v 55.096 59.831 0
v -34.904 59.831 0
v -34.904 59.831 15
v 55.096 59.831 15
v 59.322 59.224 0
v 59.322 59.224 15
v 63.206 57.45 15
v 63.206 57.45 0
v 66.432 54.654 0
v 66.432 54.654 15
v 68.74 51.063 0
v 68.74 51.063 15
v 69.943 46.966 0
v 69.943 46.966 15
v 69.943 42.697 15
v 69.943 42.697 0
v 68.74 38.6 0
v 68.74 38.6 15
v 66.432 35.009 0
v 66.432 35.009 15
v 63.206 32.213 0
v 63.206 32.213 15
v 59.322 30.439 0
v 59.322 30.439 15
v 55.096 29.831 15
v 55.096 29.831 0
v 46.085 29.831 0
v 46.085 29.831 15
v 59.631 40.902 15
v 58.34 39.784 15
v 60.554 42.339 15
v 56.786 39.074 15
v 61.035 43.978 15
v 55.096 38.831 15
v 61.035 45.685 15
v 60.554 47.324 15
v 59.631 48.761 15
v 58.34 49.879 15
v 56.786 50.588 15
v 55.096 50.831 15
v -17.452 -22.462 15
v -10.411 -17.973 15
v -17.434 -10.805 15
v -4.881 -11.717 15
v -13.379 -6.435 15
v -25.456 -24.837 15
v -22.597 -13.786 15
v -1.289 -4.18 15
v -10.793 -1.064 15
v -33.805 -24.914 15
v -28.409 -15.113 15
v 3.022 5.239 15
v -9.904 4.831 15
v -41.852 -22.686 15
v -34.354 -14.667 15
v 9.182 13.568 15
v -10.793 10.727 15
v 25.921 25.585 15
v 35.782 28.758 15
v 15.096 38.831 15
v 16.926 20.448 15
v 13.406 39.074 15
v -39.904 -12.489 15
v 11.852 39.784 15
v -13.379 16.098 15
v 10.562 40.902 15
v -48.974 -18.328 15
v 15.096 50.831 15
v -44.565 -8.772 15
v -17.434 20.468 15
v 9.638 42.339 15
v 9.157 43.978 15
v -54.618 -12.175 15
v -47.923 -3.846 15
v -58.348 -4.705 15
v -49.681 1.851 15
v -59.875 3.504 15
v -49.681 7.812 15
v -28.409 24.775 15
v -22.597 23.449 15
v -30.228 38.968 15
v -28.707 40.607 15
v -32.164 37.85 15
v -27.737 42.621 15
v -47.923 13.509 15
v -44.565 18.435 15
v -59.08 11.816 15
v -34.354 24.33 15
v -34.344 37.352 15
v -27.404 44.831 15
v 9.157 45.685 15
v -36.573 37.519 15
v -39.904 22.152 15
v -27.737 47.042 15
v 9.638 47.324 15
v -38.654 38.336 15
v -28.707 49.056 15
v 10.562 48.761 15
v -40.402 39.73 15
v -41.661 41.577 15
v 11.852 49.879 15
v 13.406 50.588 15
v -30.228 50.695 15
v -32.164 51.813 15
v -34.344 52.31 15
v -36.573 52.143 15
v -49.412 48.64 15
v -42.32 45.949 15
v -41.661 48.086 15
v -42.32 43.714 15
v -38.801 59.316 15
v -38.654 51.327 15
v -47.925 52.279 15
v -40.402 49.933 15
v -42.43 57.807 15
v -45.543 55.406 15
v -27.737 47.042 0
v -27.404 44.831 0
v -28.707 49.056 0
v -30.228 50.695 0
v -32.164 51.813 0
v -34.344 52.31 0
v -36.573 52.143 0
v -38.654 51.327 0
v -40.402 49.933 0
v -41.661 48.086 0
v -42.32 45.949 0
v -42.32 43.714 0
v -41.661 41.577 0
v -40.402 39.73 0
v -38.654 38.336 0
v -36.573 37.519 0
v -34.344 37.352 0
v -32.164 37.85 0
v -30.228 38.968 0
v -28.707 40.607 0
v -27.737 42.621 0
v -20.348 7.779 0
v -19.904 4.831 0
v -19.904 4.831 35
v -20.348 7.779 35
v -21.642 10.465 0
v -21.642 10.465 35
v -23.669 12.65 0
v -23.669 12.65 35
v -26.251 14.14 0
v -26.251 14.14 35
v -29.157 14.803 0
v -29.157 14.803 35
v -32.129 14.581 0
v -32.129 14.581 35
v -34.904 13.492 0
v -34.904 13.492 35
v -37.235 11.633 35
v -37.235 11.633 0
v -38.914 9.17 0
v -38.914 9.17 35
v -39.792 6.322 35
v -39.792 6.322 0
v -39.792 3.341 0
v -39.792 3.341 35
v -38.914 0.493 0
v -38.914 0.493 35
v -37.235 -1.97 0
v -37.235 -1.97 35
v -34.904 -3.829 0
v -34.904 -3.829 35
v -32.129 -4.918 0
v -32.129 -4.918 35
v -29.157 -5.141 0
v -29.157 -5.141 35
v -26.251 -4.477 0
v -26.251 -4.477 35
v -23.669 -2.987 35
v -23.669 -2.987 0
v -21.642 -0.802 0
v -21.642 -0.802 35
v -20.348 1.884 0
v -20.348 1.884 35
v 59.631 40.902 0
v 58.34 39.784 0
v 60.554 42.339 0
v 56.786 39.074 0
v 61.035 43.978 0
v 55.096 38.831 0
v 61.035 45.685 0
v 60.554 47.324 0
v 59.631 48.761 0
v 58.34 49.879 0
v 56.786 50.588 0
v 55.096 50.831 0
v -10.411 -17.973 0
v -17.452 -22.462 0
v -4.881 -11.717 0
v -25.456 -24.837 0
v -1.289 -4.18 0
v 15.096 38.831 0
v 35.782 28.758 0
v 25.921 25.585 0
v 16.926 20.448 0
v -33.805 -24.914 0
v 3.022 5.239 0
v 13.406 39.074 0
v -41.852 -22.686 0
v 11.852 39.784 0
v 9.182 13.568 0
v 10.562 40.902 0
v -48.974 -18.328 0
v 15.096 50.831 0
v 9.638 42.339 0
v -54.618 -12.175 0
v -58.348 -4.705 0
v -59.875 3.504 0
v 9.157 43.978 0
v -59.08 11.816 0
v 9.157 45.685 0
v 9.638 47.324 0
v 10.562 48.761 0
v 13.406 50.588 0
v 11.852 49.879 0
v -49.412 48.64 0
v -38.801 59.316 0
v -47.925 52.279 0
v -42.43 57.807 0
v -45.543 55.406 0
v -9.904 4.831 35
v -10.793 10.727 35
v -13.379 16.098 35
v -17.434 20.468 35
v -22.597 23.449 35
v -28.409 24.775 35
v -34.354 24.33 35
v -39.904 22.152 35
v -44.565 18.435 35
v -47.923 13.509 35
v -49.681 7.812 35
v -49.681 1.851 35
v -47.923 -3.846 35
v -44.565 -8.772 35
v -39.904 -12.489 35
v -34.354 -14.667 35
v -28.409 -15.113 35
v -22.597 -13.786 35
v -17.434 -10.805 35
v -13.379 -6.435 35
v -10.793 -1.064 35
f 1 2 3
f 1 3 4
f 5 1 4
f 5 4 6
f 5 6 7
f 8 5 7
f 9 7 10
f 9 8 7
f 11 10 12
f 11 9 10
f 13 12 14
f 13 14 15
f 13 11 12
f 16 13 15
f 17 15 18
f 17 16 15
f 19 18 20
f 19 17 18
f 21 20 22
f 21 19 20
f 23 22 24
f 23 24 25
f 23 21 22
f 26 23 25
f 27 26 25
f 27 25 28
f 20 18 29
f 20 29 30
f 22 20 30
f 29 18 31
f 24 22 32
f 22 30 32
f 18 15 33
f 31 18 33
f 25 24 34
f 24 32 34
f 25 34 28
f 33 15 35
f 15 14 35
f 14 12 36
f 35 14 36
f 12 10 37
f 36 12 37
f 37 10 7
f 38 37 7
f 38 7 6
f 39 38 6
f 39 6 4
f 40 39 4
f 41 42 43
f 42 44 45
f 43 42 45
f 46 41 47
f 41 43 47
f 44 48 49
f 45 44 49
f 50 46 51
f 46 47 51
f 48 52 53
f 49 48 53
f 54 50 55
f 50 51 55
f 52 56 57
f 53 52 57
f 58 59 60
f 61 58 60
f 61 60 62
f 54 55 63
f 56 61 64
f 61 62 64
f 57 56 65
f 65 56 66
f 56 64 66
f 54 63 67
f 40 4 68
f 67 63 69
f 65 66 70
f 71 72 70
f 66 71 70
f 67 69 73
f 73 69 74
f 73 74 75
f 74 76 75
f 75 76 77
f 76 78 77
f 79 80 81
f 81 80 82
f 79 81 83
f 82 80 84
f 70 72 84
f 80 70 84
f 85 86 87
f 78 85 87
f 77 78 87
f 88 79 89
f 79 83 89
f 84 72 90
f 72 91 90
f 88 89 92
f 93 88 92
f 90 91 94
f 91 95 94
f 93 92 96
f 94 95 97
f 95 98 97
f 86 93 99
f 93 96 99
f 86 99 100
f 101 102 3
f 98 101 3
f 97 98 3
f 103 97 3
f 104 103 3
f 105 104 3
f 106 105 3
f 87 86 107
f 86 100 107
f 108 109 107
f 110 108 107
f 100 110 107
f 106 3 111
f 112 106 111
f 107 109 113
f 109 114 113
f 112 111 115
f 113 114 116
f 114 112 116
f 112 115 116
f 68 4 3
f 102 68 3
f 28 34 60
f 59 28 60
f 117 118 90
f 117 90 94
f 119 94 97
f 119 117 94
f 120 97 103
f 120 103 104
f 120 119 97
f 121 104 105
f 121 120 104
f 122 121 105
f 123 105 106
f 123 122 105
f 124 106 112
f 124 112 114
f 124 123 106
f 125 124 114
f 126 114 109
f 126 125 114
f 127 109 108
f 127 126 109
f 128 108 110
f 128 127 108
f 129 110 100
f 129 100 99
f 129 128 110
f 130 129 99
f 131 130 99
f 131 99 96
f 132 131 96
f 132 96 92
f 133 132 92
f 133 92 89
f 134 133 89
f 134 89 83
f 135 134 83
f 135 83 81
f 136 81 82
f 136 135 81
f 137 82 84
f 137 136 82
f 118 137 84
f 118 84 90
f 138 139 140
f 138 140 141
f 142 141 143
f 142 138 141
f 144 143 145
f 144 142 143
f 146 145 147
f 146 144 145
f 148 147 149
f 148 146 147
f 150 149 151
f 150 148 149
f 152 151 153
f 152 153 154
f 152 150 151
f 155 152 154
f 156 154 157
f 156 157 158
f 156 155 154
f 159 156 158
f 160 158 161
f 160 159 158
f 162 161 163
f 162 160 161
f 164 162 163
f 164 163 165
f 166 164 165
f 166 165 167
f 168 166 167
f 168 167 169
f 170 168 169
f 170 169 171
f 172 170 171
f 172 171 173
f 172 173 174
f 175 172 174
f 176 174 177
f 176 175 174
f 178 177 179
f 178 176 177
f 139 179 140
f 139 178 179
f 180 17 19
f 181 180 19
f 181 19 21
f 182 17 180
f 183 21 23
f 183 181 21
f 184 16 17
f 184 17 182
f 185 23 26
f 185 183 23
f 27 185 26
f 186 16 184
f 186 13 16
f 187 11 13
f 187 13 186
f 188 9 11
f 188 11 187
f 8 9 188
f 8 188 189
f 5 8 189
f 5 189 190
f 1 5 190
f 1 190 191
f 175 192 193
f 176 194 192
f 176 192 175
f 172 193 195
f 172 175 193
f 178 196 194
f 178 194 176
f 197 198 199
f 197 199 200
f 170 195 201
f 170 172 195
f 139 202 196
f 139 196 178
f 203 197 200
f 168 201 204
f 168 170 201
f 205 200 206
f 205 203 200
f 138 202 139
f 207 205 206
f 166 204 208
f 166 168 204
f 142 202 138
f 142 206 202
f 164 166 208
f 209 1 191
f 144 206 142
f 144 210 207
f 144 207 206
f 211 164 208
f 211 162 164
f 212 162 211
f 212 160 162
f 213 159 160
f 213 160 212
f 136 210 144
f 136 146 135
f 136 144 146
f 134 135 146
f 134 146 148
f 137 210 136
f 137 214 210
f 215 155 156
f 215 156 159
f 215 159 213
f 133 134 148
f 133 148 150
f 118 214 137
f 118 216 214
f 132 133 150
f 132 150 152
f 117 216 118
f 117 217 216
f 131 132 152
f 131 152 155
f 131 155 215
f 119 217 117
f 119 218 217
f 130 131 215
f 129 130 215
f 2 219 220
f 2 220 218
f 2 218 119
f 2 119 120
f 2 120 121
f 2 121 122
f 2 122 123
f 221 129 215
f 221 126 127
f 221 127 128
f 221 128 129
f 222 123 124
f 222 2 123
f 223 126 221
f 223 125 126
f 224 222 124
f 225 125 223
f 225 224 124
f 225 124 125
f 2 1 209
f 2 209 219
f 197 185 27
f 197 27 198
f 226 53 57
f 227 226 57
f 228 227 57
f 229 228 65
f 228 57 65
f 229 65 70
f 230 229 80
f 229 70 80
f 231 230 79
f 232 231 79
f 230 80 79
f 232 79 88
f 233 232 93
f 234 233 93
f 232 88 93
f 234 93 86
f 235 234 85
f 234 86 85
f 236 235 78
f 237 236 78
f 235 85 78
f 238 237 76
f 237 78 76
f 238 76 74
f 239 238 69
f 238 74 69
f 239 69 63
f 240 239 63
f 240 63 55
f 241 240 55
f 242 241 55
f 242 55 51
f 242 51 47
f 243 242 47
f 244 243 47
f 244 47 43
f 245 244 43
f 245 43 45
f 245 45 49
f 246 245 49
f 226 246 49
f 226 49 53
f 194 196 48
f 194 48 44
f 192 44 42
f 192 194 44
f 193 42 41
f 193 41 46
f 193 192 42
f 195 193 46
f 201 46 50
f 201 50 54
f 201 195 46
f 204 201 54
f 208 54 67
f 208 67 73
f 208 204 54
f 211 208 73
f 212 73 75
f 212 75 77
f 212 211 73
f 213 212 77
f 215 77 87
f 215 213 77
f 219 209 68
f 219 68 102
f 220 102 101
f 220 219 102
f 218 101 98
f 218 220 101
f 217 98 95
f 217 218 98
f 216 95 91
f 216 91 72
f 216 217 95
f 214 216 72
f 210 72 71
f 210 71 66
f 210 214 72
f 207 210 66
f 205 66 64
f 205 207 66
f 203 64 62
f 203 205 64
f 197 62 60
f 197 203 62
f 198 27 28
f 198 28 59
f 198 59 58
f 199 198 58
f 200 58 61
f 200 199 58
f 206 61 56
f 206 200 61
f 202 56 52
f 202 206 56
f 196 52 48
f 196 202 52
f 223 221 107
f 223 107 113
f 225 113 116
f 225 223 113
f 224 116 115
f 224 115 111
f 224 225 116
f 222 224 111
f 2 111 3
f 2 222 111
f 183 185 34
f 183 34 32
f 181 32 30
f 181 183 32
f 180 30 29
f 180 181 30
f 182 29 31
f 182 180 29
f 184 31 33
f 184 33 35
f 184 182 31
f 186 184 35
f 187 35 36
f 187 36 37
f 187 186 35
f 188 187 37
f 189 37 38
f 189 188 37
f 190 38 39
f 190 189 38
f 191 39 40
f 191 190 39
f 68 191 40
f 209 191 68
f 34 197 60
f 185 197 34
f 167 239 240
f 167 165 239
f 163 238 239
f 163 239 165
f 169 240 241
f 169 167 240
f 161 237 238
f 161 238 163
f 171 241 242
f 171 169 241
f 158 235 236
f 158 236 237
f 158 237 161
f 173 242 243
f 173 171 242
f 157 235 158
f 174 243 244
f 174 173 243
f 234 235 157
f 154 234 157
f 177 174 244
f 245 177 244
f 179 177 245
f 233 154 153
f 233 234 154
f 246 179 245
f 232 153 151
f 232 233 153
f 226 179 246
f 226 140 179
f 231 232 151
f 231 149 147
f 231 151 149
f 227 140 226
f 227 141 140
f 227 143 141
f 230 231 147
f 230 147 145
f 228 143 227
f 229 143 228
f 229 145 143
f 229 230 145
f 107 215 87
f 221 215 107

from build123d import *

# Parameters (mm, degrees)
IZIM1_R                     = 20
Y_KSEKLIK_EKSTR_ZYON1_DEPTH = 35
IZIM1_4_R                   = 20
IZIM1_4_R_2                 = 7.5
Y_KSEKLIK_EKSTR_ZYON2_DEPTH = 15
IZIM1_5_R                   = 10
KES_EKSTR_ZYON1_DEPTH       = 35


with BuildPart() as part:
    # Çizim1 → Yükseklik-Ekstrüzyon1 (new body)
    with BuildSketch(Plane.XY):
        with Locations((-29.903991686, 4.831419272)):
            Circle(IZIM1_R)
    extrude(amount=Y_KSEKLIK_EKSTR_ZYON1_DEPTH)

    # Çizim1<4> → Yükseklik-Ekstrüzyon2 (add)
    with BuildSketch(Plane.XY):
        with BuildLine():
            Line((55.096008314, 59.831419272), (7.146594433, 59.831419272))
            Line((7.146594433, 59.831419272), (-34.903991686, 59.831419272))
            ThreePointArc((-34.903991686, 59.831419272), (-44.065545927, 56.70853693), (-49.412372708, 48.640209122))
            Line((-49.412372708, 48.640209122), (-59.079607017, 11.815935722))
            ThreePointArc((-59.079607017, 11.815935722), (-37.906835858, -24.081458226), (-1.28938346, -4.179917815))
            ThreePointArc((-1.28938346, -4.179917815), (16.92570157, 20.448122398), (46.085321375, 29.831419272))
            Line((46.085321375, 29.831419272), (55.096008314, 29.831419272))
            ThreePointArc((55.096008314, 29.831419272), (70.096008314, 44.831419272), (55.096008314, 59.831419272))
        make_face()
        with Locations((-29.903991686, 4.831419272)):
            Circle(IZIM1_4_R, mode=Mode.SUBTRACT)
        with Locations((-34.903991686, 44.831419272)):
            Circle(IZIM1_4_R_2, mode=Mode.SUBTRACT)
        with BuildLine():
            ThreePointArc((15.096008314, 38.831419272), (9.096008314, 44.831419272), (15.096008314, 50.831419272))
            Line((15.096008314, 50.831419272), (55.096008314, 50.831419272))
            ThreePointArc((55.096008314, 50.831419272), (61.096008314, 44.831419272), (55.096008314, 38.831419272))
            Line((55.096008314, 38.831419272), (15.096008314, 38.831419272))
        make_face(mode=Mode.SUBTRACT)
    extrude(amount=Y_KSEKLIK_EKSTR_ZYON2_DEPTH)

    # Çizim1<5> → Kes-Ekstrüzyon1 (cut)
    with BuildSketch(Plane.XY):
        with Locations((-29.903991686, 4.831419272)):
            Circle(IZIM1_5_R)
    extrude(amount=KES_EKSTR_ZYON1_DEPTH, mode=Mode.SUBTRACT)


solid = part.part
